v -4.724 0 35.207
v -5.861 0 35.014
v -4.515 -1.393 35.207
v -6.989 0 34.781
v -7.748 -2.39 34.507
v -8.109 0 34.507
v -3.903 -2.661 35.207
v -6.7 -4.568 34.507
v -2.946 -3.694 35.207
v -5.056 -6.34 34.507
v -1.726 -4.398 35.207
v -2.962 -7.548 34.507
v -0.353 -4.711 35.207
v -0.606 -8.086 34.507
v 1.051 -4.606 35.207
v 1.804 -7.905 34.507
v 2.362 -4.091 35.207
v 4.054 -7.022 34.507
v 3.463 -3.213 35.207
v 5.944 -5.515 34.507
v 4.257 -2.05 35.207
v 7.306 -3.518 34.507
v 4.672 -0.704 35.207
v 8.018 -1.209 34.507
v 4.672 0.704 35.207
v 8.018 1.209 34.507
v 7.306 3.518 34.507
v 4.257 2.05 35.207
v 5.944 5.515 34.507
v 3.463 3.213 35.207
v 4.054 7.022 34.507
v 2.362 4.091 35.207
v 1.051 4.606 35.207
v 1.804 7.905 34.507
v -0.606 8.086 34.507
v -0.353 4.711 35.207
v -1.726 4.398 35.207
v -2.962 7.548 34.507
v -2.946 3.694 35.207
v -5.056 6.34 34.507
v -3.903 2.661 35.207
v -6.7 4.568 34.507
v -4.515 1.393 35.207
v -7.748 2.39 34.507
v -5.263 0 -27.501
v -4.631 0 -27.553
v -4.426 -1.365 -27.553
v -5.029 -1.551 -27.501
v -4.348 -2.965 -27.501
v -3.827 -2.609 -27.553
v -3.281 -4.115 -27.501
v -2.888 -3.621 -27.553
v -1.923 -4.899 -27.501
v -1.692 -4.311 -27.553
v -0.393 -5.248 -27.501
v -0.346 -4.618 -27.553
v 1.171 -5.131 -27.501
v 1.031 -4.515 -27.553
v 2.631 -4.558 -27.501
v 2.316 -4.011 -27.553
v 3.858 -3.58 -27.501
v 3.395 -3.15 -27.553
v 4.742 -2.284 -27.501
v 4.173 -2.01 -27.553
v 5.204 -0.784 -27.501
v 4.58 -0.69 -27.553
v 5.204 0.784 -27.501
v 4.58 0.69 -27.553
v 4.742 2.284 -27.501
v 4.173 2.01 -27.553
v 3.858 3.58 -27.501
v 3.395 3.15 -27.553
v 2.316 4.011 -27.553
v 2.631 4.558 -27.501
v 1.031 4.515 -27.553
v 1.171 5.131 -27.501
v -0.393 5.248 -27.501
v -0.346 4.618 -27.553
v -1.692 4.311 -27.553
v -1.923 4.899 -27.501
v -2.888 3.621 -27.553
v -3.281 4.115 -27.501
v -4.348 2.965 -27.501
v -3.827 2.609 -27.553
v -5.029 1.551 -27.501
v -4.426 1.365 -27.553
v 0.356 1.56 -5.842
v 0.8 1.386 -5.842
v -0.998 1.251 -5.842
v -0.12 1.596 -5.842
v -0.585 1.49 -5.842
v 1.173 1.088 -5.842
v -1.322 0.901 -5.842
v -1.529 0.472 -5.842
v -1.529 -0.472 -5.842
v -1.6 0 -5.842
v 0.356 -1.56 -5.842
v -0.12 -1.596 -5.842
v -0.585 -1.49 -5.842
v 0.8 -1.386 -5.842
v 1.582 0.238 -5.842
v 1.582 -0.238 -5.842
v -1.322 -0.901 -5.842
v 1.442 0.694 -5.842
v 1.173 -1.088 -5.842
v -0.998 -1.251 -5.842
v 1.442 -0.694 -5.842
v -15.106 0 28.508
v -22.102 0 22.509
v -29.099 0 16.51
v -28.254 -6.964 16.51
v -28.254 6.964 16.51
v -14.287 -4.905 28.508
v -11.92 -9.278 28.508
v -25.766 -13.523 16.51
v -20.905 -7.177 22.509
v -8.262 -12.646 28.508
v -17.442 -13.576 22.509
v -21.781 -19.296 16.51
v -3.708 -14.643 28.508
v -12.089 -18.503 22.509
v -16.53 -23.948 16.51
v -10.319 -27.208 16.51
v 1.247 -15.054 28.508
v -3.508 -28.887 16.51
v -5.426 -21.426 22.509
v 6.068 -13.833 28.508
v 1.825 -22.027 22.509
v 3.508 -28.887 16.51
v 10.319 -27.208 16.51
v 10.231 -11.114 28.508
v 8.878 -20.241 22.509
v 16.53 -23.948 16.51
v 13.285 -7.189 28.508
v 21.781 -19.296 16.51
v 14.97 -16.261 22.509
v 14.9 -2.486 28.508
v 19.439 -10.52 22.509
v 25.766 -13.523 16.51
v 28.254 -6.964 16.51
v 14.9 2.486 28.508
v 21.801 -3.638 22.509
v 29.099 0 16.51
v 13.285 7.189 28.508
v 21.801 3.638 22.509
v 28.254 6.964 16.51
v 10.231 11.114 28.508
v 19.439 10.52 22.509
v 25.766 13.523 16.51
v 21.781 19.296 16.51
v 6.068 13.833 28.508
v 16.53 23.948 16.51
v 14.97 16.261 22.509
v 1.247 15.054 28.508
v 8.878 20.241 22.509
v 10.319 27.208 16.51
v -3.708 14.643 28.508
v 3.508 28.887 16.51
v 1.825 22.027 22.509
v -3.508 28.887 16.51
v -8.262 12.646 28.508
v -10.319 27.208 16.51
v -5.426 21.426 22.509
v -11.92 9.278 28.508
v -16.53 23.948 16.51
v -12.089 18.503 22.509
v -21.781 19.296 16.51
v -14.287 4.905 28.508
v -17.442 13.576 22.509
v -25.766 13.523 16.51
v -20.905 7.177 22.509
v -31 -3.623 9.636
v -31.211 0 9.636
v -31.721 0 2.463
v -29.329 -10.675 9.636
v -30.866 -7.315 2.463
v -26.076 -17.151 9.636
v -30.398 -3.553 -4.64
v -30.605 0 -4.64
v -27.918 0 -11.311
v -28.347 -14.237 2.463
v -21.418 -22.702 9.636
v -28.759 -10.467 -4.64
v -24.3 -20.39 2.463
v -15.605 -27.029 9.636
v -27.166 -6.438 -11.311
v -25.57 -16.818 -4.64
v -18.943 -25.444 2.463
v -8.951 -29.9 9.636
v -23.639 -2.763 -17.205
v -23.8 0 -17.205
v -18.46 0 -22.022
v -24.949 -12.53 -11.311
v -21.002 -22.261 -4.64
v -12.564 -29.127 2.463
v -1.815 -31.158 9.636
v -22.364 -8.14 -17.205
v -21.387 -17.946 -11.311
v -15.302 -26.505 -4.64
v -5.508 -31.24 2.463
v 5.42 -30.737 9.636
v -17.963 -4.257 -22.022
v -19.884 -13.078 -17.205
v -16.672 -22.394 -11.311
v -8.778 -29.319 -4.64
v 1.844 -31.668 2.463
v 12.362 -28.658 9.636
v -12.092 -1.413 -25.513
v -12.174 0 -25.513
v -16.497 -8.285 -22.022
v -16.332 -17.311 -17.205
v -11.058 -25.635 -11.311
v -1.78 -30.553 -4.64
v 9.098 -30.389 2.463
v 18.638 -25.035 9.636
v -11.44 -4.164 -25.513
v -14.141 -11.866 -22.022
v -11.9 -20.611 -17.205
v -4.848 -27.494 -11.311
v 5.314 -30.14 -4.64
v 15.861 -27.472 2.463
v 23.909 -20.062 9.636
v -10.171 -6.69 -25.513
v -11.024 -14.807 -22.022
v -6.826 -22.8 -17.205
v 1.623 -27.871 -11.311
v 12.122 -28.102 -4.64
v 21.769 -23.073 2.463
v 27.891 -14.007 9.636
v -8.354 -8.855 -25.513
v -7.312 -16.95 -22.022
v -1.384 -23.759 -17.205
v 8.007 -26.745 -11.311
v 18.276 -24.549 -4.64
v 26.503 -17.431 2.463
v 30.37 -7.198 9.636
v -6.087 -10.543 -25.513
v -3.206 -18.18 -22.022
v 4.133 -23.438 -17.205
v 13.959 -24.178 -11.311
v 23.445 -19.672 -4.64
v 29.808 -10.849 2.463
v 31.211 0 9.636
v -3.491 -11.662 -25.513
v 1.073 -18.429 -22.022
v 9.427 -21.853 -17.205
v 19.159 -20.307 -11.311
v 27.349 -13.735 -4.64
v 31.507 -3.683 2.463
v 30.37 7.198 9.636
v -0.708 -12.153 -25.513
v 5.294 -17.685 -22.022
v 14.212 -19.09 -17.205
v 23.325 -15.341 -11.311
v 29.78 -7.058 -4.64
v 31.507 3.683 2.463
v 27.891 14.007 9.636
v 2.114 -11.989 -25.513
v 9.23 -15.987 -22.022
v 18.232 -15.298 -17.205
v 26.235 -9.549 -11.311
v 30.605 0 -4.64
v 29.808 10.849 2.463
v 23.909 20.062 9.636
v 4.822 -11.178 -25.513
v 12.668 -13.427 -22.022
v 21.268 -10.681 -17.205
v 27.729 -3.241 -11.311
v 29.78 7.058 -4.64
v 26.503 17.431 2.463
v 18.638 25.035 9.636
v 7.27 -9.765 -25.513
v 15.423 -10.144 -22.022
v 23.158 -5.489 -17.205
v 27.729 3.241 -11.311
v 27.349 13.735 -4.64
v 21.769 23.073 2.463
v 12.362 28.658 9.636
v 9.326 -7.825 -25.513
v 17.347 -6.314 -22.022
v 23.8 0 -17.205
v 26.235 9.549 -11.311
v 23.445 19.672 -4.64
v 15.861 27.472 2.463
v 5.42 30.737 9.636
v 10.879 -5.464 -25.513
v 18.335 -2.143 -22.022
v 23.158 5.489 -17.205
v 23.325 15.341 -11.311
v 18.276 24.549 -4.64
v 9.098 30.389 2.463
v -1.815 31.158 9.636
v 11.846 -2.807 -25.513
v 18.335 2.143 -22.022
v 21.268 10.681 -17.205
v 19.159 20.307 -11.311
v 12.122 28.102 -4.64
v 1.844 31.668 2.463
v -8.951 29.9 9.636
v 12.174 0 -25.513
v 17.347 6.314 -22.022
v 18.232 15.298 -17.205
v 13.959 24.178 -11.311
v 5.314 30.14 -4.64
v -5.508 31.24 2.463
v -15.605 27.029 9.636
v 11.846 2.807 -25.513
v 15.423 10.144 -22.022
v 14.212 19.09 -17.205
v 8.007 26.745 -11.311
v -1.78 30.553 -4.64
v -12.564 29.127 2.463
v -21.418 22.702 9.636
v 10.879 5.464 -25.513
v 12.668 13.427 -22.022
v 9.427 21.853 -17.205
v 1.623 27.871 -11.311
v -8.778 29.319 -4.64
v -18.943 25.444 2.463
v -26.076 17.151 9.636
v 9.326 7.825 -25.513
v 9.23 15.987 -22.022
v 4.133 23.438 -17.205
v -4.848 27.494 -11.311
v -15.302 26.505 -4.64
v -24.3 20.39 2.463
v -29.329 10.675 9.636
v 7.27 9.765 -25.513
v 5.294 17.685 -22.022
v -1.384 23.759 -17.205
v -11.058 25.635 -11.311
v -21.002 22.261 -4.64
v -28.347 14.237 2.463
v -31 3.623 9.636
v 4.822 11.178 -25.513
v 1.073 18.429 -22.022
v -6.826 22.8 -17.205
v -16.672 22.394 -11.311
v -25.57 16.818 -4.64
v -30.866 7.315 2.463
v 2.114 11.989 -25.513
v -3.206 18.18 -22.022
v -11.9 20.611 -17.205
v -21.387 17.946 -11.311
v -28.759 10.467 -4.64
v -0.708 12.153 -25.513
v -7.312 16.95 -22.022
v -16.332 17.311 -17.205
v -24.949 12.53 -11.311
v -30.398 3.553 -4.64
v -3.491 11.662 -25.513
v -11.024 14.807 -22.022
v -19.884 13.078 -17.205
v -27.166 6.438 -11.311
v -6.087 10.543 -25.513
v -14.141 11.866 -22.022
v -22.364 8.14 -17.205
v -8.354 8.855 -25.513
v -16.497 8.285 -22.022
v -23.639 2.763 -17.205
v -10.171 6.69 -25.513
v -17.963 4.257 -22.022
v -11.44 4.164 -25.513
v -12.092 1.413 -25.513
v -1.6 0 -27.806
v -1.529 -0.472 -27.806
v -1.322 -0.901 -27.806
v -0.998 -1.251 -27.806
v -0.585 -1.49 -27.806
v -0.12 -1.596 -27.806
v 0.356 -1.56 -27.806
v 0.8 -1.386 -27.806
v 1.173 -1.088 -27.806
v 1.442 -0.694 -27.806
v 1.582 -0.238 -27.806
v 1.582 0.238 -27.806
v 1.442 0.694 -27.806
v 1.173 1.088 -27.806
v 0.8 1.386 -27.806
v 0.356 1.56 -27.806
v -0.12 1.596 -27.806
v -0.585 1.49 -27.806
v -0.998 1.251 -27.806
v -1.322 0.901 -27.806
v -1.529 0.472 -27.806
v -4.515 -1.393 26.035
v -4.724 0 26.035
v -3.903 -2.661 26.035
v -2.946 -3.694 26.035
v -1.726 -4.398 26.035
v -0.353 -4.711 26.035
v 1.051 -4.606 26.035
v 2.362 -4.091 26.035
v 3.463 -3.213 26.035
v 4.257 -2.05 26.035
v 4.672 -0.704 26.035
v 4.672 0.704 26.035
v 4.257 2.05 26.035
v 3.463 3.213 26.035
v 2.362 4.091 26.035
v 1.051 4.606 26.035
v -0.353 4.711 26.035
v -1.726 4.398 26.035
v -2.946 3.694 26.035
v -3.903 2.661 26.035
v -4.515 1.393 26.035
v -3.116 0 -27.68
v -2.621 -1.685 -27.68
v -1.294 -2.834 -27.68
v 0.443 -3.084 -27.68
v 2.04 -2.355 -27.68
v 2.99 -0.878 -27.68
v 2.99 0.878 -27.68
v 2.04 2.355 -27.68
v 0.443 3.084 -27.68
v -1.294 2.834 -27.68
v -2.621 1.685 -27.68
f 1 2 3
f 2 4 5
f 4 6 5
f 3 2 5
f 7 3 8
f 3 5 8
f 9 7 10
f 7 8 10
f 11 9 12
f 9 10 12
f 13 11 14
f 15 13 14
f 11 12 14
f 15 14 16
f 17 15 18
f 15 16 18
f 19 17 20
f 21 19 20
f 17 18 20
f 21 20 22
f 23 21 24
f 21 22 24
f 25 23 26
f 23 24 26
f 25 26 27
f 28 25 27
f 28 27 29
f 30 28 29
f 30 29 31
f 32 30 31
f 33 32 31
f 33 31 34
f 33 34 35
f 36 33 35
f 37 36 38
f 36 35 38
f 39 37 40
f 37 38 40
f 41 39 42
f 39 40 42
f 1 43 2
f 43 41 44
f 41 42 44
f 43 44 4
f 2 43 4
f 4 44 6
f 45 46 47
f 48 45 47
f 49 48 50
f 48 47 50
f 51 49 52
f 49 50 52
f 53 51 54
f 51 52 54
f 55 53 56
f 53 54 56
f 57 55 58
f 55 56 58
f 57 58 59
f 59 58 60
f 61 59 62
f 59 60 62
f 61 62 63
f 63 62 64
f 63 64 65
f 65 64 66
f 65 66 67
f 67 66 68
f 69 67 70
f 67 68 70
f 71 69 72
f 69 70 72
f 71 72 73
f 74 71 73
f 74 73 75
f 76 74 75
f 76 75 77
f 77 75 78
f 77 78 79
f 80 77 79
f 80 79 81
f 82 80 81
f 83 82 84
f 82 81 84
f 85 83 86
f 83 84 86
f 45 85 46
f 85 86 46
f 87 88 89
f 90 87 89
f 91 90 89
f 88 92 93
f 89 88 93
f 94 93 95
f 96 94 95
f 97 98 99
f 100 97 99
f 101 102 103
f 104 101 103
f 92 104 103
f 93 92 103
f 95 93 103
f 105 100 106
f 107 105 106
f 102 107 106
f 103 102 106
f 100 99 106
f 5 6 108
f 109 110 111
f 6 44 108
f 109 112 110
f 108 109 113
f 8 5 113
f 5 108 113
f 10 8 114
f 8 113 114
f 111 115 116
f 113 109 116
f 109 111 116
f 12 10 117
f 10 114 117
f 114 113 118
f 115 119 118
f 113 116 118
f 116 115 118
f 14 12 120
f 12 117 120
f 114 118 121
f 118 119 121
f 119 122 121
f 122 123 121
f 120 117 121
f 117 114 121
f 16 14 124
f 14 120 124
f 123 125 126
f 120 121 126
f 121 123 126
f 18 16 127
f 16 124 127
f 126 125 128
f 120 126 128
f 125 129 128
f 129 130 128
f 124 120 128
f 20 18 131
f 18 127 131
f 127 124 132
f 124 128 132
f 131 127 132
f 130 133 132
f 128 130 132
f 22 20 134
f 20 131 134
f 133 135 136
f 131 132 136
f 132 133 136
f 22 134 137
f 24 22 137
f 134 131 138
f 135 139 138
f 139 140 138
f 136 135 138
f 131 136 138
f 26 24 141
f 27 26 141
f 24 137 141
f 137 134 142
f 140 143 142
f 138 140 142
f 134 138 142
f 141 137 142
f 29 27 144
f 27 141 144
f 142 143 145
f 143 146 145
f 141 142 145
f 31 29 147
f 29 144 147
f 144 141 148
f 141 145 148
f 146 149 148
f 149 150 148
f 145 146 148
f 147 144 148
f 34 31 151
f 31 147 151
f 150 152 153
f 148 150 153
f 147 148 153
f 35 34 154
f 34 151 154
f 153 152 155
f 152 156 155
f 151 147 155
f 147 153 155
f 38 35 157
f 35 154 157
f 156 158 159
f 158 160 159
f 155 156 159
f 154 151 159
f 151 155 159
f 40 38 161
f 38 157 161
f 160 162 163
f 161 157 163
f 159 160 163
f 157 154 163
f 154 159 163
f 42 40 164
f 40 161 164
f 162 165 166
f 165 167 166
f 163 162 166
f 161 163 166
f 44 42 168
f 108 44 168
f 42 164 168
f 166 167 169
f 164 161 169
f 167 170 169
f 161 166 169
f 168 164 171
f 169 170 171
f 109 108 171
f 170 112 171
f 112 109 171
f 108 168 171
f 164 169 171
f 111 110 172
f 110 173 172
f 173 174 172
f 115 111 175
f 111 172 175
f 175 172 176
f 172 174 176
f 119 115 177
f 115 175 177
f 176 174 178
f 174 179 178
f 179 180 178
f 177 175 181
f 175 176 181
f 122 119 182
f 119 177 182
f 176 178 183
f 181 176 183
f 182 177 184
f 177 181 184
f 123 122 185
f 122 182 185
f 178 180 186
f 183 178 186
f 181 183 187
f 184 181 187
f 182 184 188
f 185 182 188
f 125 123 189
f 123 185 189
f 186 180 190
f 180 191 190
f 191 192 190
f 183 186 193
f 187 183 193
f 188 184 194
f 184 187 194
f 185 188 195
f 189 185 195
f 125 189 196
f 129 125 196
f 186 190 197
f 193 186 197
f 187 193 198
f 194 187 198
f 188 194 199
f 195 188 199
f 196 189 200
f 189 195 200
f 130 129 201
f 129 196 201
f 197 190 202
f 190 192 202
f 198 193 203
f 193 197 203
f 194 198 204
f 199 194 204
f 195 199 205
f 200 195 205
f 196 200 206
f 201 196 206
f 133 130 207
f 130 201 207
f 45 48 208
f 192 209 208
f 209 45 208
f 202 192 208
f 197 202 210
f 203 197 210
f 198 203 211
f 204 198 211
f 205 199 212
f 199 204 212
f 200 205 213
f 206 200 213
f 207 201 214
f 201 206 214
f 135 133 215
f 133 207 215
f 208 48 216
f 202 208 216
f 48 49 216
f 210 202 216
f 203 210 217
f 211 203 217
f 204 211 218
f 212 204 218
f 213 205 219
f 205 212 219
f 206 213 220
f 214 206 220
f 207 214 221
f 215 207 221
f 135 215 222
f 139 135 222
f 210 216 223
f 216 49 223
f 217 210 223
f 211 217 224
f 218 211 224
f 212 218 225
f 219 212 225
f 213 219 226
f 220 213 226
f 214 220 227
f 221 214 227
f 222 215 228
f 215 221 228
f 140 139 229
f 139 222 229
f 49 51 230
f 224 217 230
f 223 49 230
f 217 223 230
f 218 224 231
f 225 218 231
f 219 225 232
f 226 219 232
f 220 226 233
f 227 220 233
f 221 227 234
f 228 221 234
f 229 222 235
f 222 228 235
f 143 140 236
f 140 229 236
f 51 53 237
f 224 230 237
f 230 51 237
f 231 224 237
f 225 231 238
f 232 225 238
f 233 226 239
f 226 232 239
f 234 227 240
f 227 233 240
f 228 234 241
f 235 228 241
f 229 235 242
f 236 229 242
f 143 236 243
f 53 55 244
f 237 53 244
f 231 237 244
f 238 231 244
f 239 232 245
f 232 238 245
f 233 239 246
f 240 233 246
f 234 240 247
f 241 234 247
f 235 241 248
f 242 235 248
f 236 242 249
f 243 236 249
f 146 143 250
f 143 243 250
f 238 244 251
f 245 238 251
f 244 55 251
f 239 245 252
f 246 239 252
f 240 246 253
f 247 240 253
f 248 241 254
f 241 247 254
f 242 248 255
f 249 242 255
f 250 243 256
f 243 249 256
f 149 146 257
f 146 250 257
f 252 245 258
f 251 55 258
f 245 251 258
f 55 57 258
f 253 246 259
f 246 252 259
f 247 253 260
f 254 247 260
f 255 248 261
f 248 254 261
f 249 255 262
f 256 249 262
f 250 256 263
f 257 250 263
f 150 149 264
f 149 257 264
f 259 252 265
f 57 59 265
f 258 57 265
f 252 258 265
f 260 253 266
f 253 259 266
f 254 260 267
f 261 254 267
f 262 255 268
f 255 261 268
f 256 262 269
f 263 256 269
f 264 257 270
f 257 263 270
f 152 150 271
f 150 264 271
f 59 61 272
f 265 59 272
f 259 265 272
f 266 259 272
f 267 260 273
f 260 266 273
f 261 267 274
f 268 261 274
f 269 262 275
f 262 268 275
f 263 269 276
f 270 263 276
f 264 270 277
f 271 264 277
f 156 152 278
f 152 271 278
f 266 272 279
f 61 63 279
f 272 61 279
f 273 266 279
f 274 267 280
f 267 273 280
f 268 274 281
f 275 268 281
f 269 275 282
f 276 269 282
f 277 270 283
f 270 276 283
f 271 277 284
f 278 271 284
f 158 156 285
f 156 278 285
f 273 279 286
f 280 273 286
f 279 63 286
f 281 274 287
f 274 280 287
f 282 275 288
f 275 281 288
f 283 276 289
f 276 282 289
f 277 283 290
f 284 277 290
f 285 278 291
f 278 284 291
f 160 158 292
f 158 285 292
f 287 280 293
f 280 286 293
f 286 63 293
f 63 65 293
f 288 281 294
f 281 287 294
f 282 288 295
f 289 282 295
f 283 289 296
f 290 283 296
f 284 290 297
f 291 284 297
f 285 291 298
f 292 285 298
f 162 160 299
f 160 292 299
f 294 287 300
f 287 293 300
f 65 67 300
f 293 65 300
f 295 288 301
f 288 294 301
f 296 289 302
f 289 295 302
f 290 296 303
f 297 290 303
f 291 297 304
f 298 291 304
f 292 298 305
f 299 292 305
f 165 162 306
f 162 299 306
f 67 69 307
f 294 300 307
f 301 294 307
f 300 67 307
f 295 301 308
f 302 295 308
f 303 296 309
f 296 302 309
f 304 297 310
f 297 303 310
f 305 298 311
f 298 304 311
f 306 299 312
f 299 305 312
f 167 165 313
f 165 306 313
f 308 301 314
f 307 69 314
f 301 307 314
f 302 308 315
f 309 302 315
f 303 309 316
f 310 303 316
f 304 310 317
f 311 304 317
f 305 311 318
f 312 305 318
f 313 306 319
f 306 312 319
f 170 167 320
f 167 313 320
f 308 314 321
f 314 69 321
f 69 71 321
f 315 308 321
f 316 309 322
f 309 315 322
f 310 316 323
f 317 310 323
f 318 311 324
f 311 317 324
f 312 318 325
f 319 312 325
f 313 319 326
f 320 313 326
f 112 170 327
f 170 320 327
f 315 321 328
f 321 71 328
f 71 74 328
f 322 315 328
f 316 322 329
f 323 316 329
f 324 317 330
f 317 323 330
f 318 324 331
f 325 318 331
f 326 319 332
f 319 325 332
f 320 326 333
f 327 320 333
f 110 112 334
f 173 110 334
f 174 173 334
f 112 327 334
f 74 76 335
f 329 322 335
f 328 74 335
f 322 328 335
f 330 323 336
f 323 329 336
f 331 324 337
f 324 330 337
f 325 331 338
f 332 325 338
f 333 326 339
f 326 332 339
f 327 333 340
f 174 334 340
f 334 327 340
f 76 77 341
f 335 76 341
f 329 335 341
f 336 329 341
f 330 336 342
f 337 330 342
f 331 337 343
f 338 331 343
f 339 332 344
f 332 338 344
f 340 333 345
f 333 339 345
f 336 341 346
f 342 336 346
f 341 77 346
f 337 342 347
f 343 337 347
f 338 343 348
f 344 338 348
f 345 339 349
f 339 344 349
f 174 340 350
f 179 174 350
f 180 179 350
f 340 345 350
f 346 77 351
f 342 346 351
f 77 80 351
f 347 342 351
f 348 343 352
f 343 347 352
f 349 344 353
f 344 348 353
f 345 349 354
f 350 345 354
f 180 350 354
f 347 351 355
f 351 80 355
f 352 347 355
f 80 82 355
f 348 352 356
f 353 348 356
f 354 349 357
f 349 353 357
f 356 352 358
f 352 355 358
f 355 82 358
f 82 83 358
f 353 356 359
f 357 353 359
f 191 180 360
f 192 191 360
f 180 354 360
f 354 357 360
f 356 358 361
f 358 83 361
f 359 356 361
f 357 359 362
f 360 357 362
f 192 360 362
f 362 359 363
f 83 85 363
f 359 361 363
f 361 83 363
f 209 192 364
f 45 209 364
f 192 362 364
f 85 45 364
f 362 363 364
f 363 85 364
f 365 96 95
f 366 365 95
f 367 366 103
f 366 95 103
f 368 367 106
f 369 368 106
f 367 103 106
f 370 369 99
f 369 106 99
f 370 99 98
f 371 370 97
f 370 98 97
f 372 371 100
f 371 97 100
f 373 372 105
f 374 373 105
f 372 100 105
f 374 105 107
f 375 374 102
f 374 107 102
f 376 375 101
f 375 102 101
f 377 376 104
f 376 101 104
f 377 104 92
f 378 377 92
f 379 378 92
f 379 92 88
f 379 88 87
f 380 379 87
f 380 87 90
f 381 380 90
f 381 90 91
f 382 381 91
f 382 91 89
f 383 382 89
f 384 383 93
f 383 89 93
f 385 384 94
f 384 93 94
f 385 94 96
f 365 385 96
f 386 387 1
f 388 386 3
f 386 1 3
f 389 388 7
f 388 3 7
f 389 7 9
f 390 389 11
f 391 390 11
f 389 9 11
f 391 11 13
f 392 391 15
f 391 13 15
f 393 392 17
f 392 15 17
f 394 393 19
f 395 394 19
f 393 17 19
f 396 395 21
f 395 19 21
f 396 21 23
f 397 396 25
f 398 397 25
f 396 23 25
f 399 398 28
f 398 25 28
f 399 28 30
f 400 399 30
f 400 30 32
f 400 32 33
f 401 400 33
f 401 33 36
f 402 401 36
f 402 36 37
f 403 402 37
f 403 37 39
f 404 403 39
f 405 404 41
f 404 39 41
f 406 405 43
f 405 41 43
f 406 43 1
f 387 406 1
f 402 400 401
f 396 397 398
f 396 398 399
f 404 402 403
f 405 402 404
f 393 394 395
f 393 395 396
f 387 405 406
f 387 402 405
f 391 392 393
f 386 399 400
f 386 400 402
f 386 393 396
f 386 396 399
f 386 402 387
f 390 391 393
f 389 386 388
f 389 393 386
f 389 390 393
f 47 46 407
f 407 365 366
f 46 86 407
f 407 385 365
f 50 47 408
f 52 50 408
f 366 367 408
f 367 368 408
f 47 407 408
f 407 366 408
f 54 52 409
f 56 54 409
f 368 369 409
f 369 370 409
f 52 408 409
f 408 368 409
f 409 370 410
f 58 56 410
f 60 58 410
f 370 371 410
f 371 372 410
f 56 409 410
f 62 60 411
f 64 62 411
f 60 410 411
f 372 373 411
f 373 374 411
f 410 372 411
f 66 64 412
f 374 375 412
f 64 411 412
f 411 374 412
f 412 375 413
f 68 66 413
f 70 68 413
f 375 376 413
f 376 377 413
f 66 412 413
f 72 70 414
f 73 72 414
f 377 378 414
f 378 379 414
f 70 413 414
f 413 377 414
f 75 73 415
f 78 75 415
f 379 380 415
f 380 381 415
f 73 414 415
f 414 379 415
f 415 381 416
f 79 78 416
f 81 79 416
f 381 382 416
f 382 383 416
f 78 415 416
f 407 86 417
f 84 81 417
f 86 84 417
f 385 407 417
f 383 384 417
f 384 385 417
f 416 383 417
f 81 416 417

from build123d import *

# Parameters (mm, degrees)
F0_W = 4.7244
F0_H = 9.525


# Not quite as in the source:
# - a feature names something its author has since deleted; it is built from what else it names


with BuildPart() as f1:
    # F0 (on Front) → F1 (revolve)
    with BuildSketch(Plane.XZ):
        with BuildLine():
            Line((-8.1087104998, 34.5070896671), (-22.5402639736, 16.51))
            ThreePointArc((-22.5402639736, 16.51), (-25.8838273037, -10.5200325148), (-4.6314331906, -27.5534648747))
            Line((-4.6314331906, -27.5534648747), (-1.6002, -27.8064487898))
            Line((-1.6002, -27.8064487898), (-1.6002, -5.842))
            Line((-1.6002, -5.842), (0, -5.842))
            Line((0, -5.842), (0, 0))
            Line((0, 0), (0, 3.81))
            Line((0, 3.81), (0, 16.51))
            Line((0, 16.51), (-4.7244, 16.51))
            Line((-4.7244, 16.51), (-4.7244, 26.035))
            Line((-4.7244, 26.035), (-4.7244, 35.2065371441))
            ThreePointArc((-4.7244, 35.2065371441), (-6.4260787397, 34.9028932721), (-8.1087104998, 34.5070896671))
        make_face()
        with Locations((-2.3622, 21.2725)):
            Rectangle(F0_W, F0_H)
        with BuildLine():
            Line((0, 0), (0, -5.842))
            Line((0, -5.842), (0, -25.4))
            ThreePointArc((0, -25.4), (23.0706956982, -10.625582337), (19.302328875, 16.51))
            Line((19.302328875, 16.51), (0, 16.51))
            Line((0, 16.51), (0, 3.81))
            Line((0, 3.81), (0, 0))
        make_face()
    revolve(axis=Axis((0, 0, 3.81), (0, 0, 1)))

    # F0 (on Front) → F2 (revolve)
    with BuildSketch(Plane.XZ):
        with BuildLine():
            Line((-8.1087104998, 34.5070896671), (-22.5402639736, 16.51))
            ThreePointArc((-22.5402639736, 16.51), (-25.8838273037, -10.5200325148), (-4.6314331906, -27.5534648747))
            Line((-4.6314331906, -27.5534648747), (-1.6002, -27.8064487898))
            Line((-1.6002, -27.8064487898), (-1.6002, -5.842))
            Line((-1.6002, -5.842), (0, -5.842))
            Line((0, -5.842), (0, 0))
            Line((0, 0), (0, 3.81))
            Line((0, 3.81), (0, 16.51))
            Line((0, 16.51), (-4.7244, 16.51))
            Line((-4.7244, 16.51), (-4.7244, 26.035))
            Line((-4.7244, 26.035), (-4.7244, 35.2065371441))
            ThreePointArc((-4.7244, 35.2065371441), (-6.4260787397, 34.9028932721), (-8.1087104998, 34.5070896671))
        make_face()
        with BuildLine():
            ThreePointArc((-4.6314331906, -27.5534648747), (-25.8838273037, -10.5200325148), (-22.5402639736, 16.51))
            Line((-22.5402639736, 16.51), (-29.099355663, 16.51))
            ThreePointArc((-29.099355663, 16.51), (-27.9182626522, -11.3106187202), (-5.2629922621, -27.5007555394))
            Line((-5.2629922621, -27.5007555394), (-4.6314331906, -27.5534648747))
        make_face()
        Polygon((-29.099355663, 16.51), (-22.5402639736, 16.51), (-8.1087104998, 34.5070896671), align=None)
    revolve(axis=Axis((0, 0, -12.065), (0, 0, 1)))


solid = f1.part
